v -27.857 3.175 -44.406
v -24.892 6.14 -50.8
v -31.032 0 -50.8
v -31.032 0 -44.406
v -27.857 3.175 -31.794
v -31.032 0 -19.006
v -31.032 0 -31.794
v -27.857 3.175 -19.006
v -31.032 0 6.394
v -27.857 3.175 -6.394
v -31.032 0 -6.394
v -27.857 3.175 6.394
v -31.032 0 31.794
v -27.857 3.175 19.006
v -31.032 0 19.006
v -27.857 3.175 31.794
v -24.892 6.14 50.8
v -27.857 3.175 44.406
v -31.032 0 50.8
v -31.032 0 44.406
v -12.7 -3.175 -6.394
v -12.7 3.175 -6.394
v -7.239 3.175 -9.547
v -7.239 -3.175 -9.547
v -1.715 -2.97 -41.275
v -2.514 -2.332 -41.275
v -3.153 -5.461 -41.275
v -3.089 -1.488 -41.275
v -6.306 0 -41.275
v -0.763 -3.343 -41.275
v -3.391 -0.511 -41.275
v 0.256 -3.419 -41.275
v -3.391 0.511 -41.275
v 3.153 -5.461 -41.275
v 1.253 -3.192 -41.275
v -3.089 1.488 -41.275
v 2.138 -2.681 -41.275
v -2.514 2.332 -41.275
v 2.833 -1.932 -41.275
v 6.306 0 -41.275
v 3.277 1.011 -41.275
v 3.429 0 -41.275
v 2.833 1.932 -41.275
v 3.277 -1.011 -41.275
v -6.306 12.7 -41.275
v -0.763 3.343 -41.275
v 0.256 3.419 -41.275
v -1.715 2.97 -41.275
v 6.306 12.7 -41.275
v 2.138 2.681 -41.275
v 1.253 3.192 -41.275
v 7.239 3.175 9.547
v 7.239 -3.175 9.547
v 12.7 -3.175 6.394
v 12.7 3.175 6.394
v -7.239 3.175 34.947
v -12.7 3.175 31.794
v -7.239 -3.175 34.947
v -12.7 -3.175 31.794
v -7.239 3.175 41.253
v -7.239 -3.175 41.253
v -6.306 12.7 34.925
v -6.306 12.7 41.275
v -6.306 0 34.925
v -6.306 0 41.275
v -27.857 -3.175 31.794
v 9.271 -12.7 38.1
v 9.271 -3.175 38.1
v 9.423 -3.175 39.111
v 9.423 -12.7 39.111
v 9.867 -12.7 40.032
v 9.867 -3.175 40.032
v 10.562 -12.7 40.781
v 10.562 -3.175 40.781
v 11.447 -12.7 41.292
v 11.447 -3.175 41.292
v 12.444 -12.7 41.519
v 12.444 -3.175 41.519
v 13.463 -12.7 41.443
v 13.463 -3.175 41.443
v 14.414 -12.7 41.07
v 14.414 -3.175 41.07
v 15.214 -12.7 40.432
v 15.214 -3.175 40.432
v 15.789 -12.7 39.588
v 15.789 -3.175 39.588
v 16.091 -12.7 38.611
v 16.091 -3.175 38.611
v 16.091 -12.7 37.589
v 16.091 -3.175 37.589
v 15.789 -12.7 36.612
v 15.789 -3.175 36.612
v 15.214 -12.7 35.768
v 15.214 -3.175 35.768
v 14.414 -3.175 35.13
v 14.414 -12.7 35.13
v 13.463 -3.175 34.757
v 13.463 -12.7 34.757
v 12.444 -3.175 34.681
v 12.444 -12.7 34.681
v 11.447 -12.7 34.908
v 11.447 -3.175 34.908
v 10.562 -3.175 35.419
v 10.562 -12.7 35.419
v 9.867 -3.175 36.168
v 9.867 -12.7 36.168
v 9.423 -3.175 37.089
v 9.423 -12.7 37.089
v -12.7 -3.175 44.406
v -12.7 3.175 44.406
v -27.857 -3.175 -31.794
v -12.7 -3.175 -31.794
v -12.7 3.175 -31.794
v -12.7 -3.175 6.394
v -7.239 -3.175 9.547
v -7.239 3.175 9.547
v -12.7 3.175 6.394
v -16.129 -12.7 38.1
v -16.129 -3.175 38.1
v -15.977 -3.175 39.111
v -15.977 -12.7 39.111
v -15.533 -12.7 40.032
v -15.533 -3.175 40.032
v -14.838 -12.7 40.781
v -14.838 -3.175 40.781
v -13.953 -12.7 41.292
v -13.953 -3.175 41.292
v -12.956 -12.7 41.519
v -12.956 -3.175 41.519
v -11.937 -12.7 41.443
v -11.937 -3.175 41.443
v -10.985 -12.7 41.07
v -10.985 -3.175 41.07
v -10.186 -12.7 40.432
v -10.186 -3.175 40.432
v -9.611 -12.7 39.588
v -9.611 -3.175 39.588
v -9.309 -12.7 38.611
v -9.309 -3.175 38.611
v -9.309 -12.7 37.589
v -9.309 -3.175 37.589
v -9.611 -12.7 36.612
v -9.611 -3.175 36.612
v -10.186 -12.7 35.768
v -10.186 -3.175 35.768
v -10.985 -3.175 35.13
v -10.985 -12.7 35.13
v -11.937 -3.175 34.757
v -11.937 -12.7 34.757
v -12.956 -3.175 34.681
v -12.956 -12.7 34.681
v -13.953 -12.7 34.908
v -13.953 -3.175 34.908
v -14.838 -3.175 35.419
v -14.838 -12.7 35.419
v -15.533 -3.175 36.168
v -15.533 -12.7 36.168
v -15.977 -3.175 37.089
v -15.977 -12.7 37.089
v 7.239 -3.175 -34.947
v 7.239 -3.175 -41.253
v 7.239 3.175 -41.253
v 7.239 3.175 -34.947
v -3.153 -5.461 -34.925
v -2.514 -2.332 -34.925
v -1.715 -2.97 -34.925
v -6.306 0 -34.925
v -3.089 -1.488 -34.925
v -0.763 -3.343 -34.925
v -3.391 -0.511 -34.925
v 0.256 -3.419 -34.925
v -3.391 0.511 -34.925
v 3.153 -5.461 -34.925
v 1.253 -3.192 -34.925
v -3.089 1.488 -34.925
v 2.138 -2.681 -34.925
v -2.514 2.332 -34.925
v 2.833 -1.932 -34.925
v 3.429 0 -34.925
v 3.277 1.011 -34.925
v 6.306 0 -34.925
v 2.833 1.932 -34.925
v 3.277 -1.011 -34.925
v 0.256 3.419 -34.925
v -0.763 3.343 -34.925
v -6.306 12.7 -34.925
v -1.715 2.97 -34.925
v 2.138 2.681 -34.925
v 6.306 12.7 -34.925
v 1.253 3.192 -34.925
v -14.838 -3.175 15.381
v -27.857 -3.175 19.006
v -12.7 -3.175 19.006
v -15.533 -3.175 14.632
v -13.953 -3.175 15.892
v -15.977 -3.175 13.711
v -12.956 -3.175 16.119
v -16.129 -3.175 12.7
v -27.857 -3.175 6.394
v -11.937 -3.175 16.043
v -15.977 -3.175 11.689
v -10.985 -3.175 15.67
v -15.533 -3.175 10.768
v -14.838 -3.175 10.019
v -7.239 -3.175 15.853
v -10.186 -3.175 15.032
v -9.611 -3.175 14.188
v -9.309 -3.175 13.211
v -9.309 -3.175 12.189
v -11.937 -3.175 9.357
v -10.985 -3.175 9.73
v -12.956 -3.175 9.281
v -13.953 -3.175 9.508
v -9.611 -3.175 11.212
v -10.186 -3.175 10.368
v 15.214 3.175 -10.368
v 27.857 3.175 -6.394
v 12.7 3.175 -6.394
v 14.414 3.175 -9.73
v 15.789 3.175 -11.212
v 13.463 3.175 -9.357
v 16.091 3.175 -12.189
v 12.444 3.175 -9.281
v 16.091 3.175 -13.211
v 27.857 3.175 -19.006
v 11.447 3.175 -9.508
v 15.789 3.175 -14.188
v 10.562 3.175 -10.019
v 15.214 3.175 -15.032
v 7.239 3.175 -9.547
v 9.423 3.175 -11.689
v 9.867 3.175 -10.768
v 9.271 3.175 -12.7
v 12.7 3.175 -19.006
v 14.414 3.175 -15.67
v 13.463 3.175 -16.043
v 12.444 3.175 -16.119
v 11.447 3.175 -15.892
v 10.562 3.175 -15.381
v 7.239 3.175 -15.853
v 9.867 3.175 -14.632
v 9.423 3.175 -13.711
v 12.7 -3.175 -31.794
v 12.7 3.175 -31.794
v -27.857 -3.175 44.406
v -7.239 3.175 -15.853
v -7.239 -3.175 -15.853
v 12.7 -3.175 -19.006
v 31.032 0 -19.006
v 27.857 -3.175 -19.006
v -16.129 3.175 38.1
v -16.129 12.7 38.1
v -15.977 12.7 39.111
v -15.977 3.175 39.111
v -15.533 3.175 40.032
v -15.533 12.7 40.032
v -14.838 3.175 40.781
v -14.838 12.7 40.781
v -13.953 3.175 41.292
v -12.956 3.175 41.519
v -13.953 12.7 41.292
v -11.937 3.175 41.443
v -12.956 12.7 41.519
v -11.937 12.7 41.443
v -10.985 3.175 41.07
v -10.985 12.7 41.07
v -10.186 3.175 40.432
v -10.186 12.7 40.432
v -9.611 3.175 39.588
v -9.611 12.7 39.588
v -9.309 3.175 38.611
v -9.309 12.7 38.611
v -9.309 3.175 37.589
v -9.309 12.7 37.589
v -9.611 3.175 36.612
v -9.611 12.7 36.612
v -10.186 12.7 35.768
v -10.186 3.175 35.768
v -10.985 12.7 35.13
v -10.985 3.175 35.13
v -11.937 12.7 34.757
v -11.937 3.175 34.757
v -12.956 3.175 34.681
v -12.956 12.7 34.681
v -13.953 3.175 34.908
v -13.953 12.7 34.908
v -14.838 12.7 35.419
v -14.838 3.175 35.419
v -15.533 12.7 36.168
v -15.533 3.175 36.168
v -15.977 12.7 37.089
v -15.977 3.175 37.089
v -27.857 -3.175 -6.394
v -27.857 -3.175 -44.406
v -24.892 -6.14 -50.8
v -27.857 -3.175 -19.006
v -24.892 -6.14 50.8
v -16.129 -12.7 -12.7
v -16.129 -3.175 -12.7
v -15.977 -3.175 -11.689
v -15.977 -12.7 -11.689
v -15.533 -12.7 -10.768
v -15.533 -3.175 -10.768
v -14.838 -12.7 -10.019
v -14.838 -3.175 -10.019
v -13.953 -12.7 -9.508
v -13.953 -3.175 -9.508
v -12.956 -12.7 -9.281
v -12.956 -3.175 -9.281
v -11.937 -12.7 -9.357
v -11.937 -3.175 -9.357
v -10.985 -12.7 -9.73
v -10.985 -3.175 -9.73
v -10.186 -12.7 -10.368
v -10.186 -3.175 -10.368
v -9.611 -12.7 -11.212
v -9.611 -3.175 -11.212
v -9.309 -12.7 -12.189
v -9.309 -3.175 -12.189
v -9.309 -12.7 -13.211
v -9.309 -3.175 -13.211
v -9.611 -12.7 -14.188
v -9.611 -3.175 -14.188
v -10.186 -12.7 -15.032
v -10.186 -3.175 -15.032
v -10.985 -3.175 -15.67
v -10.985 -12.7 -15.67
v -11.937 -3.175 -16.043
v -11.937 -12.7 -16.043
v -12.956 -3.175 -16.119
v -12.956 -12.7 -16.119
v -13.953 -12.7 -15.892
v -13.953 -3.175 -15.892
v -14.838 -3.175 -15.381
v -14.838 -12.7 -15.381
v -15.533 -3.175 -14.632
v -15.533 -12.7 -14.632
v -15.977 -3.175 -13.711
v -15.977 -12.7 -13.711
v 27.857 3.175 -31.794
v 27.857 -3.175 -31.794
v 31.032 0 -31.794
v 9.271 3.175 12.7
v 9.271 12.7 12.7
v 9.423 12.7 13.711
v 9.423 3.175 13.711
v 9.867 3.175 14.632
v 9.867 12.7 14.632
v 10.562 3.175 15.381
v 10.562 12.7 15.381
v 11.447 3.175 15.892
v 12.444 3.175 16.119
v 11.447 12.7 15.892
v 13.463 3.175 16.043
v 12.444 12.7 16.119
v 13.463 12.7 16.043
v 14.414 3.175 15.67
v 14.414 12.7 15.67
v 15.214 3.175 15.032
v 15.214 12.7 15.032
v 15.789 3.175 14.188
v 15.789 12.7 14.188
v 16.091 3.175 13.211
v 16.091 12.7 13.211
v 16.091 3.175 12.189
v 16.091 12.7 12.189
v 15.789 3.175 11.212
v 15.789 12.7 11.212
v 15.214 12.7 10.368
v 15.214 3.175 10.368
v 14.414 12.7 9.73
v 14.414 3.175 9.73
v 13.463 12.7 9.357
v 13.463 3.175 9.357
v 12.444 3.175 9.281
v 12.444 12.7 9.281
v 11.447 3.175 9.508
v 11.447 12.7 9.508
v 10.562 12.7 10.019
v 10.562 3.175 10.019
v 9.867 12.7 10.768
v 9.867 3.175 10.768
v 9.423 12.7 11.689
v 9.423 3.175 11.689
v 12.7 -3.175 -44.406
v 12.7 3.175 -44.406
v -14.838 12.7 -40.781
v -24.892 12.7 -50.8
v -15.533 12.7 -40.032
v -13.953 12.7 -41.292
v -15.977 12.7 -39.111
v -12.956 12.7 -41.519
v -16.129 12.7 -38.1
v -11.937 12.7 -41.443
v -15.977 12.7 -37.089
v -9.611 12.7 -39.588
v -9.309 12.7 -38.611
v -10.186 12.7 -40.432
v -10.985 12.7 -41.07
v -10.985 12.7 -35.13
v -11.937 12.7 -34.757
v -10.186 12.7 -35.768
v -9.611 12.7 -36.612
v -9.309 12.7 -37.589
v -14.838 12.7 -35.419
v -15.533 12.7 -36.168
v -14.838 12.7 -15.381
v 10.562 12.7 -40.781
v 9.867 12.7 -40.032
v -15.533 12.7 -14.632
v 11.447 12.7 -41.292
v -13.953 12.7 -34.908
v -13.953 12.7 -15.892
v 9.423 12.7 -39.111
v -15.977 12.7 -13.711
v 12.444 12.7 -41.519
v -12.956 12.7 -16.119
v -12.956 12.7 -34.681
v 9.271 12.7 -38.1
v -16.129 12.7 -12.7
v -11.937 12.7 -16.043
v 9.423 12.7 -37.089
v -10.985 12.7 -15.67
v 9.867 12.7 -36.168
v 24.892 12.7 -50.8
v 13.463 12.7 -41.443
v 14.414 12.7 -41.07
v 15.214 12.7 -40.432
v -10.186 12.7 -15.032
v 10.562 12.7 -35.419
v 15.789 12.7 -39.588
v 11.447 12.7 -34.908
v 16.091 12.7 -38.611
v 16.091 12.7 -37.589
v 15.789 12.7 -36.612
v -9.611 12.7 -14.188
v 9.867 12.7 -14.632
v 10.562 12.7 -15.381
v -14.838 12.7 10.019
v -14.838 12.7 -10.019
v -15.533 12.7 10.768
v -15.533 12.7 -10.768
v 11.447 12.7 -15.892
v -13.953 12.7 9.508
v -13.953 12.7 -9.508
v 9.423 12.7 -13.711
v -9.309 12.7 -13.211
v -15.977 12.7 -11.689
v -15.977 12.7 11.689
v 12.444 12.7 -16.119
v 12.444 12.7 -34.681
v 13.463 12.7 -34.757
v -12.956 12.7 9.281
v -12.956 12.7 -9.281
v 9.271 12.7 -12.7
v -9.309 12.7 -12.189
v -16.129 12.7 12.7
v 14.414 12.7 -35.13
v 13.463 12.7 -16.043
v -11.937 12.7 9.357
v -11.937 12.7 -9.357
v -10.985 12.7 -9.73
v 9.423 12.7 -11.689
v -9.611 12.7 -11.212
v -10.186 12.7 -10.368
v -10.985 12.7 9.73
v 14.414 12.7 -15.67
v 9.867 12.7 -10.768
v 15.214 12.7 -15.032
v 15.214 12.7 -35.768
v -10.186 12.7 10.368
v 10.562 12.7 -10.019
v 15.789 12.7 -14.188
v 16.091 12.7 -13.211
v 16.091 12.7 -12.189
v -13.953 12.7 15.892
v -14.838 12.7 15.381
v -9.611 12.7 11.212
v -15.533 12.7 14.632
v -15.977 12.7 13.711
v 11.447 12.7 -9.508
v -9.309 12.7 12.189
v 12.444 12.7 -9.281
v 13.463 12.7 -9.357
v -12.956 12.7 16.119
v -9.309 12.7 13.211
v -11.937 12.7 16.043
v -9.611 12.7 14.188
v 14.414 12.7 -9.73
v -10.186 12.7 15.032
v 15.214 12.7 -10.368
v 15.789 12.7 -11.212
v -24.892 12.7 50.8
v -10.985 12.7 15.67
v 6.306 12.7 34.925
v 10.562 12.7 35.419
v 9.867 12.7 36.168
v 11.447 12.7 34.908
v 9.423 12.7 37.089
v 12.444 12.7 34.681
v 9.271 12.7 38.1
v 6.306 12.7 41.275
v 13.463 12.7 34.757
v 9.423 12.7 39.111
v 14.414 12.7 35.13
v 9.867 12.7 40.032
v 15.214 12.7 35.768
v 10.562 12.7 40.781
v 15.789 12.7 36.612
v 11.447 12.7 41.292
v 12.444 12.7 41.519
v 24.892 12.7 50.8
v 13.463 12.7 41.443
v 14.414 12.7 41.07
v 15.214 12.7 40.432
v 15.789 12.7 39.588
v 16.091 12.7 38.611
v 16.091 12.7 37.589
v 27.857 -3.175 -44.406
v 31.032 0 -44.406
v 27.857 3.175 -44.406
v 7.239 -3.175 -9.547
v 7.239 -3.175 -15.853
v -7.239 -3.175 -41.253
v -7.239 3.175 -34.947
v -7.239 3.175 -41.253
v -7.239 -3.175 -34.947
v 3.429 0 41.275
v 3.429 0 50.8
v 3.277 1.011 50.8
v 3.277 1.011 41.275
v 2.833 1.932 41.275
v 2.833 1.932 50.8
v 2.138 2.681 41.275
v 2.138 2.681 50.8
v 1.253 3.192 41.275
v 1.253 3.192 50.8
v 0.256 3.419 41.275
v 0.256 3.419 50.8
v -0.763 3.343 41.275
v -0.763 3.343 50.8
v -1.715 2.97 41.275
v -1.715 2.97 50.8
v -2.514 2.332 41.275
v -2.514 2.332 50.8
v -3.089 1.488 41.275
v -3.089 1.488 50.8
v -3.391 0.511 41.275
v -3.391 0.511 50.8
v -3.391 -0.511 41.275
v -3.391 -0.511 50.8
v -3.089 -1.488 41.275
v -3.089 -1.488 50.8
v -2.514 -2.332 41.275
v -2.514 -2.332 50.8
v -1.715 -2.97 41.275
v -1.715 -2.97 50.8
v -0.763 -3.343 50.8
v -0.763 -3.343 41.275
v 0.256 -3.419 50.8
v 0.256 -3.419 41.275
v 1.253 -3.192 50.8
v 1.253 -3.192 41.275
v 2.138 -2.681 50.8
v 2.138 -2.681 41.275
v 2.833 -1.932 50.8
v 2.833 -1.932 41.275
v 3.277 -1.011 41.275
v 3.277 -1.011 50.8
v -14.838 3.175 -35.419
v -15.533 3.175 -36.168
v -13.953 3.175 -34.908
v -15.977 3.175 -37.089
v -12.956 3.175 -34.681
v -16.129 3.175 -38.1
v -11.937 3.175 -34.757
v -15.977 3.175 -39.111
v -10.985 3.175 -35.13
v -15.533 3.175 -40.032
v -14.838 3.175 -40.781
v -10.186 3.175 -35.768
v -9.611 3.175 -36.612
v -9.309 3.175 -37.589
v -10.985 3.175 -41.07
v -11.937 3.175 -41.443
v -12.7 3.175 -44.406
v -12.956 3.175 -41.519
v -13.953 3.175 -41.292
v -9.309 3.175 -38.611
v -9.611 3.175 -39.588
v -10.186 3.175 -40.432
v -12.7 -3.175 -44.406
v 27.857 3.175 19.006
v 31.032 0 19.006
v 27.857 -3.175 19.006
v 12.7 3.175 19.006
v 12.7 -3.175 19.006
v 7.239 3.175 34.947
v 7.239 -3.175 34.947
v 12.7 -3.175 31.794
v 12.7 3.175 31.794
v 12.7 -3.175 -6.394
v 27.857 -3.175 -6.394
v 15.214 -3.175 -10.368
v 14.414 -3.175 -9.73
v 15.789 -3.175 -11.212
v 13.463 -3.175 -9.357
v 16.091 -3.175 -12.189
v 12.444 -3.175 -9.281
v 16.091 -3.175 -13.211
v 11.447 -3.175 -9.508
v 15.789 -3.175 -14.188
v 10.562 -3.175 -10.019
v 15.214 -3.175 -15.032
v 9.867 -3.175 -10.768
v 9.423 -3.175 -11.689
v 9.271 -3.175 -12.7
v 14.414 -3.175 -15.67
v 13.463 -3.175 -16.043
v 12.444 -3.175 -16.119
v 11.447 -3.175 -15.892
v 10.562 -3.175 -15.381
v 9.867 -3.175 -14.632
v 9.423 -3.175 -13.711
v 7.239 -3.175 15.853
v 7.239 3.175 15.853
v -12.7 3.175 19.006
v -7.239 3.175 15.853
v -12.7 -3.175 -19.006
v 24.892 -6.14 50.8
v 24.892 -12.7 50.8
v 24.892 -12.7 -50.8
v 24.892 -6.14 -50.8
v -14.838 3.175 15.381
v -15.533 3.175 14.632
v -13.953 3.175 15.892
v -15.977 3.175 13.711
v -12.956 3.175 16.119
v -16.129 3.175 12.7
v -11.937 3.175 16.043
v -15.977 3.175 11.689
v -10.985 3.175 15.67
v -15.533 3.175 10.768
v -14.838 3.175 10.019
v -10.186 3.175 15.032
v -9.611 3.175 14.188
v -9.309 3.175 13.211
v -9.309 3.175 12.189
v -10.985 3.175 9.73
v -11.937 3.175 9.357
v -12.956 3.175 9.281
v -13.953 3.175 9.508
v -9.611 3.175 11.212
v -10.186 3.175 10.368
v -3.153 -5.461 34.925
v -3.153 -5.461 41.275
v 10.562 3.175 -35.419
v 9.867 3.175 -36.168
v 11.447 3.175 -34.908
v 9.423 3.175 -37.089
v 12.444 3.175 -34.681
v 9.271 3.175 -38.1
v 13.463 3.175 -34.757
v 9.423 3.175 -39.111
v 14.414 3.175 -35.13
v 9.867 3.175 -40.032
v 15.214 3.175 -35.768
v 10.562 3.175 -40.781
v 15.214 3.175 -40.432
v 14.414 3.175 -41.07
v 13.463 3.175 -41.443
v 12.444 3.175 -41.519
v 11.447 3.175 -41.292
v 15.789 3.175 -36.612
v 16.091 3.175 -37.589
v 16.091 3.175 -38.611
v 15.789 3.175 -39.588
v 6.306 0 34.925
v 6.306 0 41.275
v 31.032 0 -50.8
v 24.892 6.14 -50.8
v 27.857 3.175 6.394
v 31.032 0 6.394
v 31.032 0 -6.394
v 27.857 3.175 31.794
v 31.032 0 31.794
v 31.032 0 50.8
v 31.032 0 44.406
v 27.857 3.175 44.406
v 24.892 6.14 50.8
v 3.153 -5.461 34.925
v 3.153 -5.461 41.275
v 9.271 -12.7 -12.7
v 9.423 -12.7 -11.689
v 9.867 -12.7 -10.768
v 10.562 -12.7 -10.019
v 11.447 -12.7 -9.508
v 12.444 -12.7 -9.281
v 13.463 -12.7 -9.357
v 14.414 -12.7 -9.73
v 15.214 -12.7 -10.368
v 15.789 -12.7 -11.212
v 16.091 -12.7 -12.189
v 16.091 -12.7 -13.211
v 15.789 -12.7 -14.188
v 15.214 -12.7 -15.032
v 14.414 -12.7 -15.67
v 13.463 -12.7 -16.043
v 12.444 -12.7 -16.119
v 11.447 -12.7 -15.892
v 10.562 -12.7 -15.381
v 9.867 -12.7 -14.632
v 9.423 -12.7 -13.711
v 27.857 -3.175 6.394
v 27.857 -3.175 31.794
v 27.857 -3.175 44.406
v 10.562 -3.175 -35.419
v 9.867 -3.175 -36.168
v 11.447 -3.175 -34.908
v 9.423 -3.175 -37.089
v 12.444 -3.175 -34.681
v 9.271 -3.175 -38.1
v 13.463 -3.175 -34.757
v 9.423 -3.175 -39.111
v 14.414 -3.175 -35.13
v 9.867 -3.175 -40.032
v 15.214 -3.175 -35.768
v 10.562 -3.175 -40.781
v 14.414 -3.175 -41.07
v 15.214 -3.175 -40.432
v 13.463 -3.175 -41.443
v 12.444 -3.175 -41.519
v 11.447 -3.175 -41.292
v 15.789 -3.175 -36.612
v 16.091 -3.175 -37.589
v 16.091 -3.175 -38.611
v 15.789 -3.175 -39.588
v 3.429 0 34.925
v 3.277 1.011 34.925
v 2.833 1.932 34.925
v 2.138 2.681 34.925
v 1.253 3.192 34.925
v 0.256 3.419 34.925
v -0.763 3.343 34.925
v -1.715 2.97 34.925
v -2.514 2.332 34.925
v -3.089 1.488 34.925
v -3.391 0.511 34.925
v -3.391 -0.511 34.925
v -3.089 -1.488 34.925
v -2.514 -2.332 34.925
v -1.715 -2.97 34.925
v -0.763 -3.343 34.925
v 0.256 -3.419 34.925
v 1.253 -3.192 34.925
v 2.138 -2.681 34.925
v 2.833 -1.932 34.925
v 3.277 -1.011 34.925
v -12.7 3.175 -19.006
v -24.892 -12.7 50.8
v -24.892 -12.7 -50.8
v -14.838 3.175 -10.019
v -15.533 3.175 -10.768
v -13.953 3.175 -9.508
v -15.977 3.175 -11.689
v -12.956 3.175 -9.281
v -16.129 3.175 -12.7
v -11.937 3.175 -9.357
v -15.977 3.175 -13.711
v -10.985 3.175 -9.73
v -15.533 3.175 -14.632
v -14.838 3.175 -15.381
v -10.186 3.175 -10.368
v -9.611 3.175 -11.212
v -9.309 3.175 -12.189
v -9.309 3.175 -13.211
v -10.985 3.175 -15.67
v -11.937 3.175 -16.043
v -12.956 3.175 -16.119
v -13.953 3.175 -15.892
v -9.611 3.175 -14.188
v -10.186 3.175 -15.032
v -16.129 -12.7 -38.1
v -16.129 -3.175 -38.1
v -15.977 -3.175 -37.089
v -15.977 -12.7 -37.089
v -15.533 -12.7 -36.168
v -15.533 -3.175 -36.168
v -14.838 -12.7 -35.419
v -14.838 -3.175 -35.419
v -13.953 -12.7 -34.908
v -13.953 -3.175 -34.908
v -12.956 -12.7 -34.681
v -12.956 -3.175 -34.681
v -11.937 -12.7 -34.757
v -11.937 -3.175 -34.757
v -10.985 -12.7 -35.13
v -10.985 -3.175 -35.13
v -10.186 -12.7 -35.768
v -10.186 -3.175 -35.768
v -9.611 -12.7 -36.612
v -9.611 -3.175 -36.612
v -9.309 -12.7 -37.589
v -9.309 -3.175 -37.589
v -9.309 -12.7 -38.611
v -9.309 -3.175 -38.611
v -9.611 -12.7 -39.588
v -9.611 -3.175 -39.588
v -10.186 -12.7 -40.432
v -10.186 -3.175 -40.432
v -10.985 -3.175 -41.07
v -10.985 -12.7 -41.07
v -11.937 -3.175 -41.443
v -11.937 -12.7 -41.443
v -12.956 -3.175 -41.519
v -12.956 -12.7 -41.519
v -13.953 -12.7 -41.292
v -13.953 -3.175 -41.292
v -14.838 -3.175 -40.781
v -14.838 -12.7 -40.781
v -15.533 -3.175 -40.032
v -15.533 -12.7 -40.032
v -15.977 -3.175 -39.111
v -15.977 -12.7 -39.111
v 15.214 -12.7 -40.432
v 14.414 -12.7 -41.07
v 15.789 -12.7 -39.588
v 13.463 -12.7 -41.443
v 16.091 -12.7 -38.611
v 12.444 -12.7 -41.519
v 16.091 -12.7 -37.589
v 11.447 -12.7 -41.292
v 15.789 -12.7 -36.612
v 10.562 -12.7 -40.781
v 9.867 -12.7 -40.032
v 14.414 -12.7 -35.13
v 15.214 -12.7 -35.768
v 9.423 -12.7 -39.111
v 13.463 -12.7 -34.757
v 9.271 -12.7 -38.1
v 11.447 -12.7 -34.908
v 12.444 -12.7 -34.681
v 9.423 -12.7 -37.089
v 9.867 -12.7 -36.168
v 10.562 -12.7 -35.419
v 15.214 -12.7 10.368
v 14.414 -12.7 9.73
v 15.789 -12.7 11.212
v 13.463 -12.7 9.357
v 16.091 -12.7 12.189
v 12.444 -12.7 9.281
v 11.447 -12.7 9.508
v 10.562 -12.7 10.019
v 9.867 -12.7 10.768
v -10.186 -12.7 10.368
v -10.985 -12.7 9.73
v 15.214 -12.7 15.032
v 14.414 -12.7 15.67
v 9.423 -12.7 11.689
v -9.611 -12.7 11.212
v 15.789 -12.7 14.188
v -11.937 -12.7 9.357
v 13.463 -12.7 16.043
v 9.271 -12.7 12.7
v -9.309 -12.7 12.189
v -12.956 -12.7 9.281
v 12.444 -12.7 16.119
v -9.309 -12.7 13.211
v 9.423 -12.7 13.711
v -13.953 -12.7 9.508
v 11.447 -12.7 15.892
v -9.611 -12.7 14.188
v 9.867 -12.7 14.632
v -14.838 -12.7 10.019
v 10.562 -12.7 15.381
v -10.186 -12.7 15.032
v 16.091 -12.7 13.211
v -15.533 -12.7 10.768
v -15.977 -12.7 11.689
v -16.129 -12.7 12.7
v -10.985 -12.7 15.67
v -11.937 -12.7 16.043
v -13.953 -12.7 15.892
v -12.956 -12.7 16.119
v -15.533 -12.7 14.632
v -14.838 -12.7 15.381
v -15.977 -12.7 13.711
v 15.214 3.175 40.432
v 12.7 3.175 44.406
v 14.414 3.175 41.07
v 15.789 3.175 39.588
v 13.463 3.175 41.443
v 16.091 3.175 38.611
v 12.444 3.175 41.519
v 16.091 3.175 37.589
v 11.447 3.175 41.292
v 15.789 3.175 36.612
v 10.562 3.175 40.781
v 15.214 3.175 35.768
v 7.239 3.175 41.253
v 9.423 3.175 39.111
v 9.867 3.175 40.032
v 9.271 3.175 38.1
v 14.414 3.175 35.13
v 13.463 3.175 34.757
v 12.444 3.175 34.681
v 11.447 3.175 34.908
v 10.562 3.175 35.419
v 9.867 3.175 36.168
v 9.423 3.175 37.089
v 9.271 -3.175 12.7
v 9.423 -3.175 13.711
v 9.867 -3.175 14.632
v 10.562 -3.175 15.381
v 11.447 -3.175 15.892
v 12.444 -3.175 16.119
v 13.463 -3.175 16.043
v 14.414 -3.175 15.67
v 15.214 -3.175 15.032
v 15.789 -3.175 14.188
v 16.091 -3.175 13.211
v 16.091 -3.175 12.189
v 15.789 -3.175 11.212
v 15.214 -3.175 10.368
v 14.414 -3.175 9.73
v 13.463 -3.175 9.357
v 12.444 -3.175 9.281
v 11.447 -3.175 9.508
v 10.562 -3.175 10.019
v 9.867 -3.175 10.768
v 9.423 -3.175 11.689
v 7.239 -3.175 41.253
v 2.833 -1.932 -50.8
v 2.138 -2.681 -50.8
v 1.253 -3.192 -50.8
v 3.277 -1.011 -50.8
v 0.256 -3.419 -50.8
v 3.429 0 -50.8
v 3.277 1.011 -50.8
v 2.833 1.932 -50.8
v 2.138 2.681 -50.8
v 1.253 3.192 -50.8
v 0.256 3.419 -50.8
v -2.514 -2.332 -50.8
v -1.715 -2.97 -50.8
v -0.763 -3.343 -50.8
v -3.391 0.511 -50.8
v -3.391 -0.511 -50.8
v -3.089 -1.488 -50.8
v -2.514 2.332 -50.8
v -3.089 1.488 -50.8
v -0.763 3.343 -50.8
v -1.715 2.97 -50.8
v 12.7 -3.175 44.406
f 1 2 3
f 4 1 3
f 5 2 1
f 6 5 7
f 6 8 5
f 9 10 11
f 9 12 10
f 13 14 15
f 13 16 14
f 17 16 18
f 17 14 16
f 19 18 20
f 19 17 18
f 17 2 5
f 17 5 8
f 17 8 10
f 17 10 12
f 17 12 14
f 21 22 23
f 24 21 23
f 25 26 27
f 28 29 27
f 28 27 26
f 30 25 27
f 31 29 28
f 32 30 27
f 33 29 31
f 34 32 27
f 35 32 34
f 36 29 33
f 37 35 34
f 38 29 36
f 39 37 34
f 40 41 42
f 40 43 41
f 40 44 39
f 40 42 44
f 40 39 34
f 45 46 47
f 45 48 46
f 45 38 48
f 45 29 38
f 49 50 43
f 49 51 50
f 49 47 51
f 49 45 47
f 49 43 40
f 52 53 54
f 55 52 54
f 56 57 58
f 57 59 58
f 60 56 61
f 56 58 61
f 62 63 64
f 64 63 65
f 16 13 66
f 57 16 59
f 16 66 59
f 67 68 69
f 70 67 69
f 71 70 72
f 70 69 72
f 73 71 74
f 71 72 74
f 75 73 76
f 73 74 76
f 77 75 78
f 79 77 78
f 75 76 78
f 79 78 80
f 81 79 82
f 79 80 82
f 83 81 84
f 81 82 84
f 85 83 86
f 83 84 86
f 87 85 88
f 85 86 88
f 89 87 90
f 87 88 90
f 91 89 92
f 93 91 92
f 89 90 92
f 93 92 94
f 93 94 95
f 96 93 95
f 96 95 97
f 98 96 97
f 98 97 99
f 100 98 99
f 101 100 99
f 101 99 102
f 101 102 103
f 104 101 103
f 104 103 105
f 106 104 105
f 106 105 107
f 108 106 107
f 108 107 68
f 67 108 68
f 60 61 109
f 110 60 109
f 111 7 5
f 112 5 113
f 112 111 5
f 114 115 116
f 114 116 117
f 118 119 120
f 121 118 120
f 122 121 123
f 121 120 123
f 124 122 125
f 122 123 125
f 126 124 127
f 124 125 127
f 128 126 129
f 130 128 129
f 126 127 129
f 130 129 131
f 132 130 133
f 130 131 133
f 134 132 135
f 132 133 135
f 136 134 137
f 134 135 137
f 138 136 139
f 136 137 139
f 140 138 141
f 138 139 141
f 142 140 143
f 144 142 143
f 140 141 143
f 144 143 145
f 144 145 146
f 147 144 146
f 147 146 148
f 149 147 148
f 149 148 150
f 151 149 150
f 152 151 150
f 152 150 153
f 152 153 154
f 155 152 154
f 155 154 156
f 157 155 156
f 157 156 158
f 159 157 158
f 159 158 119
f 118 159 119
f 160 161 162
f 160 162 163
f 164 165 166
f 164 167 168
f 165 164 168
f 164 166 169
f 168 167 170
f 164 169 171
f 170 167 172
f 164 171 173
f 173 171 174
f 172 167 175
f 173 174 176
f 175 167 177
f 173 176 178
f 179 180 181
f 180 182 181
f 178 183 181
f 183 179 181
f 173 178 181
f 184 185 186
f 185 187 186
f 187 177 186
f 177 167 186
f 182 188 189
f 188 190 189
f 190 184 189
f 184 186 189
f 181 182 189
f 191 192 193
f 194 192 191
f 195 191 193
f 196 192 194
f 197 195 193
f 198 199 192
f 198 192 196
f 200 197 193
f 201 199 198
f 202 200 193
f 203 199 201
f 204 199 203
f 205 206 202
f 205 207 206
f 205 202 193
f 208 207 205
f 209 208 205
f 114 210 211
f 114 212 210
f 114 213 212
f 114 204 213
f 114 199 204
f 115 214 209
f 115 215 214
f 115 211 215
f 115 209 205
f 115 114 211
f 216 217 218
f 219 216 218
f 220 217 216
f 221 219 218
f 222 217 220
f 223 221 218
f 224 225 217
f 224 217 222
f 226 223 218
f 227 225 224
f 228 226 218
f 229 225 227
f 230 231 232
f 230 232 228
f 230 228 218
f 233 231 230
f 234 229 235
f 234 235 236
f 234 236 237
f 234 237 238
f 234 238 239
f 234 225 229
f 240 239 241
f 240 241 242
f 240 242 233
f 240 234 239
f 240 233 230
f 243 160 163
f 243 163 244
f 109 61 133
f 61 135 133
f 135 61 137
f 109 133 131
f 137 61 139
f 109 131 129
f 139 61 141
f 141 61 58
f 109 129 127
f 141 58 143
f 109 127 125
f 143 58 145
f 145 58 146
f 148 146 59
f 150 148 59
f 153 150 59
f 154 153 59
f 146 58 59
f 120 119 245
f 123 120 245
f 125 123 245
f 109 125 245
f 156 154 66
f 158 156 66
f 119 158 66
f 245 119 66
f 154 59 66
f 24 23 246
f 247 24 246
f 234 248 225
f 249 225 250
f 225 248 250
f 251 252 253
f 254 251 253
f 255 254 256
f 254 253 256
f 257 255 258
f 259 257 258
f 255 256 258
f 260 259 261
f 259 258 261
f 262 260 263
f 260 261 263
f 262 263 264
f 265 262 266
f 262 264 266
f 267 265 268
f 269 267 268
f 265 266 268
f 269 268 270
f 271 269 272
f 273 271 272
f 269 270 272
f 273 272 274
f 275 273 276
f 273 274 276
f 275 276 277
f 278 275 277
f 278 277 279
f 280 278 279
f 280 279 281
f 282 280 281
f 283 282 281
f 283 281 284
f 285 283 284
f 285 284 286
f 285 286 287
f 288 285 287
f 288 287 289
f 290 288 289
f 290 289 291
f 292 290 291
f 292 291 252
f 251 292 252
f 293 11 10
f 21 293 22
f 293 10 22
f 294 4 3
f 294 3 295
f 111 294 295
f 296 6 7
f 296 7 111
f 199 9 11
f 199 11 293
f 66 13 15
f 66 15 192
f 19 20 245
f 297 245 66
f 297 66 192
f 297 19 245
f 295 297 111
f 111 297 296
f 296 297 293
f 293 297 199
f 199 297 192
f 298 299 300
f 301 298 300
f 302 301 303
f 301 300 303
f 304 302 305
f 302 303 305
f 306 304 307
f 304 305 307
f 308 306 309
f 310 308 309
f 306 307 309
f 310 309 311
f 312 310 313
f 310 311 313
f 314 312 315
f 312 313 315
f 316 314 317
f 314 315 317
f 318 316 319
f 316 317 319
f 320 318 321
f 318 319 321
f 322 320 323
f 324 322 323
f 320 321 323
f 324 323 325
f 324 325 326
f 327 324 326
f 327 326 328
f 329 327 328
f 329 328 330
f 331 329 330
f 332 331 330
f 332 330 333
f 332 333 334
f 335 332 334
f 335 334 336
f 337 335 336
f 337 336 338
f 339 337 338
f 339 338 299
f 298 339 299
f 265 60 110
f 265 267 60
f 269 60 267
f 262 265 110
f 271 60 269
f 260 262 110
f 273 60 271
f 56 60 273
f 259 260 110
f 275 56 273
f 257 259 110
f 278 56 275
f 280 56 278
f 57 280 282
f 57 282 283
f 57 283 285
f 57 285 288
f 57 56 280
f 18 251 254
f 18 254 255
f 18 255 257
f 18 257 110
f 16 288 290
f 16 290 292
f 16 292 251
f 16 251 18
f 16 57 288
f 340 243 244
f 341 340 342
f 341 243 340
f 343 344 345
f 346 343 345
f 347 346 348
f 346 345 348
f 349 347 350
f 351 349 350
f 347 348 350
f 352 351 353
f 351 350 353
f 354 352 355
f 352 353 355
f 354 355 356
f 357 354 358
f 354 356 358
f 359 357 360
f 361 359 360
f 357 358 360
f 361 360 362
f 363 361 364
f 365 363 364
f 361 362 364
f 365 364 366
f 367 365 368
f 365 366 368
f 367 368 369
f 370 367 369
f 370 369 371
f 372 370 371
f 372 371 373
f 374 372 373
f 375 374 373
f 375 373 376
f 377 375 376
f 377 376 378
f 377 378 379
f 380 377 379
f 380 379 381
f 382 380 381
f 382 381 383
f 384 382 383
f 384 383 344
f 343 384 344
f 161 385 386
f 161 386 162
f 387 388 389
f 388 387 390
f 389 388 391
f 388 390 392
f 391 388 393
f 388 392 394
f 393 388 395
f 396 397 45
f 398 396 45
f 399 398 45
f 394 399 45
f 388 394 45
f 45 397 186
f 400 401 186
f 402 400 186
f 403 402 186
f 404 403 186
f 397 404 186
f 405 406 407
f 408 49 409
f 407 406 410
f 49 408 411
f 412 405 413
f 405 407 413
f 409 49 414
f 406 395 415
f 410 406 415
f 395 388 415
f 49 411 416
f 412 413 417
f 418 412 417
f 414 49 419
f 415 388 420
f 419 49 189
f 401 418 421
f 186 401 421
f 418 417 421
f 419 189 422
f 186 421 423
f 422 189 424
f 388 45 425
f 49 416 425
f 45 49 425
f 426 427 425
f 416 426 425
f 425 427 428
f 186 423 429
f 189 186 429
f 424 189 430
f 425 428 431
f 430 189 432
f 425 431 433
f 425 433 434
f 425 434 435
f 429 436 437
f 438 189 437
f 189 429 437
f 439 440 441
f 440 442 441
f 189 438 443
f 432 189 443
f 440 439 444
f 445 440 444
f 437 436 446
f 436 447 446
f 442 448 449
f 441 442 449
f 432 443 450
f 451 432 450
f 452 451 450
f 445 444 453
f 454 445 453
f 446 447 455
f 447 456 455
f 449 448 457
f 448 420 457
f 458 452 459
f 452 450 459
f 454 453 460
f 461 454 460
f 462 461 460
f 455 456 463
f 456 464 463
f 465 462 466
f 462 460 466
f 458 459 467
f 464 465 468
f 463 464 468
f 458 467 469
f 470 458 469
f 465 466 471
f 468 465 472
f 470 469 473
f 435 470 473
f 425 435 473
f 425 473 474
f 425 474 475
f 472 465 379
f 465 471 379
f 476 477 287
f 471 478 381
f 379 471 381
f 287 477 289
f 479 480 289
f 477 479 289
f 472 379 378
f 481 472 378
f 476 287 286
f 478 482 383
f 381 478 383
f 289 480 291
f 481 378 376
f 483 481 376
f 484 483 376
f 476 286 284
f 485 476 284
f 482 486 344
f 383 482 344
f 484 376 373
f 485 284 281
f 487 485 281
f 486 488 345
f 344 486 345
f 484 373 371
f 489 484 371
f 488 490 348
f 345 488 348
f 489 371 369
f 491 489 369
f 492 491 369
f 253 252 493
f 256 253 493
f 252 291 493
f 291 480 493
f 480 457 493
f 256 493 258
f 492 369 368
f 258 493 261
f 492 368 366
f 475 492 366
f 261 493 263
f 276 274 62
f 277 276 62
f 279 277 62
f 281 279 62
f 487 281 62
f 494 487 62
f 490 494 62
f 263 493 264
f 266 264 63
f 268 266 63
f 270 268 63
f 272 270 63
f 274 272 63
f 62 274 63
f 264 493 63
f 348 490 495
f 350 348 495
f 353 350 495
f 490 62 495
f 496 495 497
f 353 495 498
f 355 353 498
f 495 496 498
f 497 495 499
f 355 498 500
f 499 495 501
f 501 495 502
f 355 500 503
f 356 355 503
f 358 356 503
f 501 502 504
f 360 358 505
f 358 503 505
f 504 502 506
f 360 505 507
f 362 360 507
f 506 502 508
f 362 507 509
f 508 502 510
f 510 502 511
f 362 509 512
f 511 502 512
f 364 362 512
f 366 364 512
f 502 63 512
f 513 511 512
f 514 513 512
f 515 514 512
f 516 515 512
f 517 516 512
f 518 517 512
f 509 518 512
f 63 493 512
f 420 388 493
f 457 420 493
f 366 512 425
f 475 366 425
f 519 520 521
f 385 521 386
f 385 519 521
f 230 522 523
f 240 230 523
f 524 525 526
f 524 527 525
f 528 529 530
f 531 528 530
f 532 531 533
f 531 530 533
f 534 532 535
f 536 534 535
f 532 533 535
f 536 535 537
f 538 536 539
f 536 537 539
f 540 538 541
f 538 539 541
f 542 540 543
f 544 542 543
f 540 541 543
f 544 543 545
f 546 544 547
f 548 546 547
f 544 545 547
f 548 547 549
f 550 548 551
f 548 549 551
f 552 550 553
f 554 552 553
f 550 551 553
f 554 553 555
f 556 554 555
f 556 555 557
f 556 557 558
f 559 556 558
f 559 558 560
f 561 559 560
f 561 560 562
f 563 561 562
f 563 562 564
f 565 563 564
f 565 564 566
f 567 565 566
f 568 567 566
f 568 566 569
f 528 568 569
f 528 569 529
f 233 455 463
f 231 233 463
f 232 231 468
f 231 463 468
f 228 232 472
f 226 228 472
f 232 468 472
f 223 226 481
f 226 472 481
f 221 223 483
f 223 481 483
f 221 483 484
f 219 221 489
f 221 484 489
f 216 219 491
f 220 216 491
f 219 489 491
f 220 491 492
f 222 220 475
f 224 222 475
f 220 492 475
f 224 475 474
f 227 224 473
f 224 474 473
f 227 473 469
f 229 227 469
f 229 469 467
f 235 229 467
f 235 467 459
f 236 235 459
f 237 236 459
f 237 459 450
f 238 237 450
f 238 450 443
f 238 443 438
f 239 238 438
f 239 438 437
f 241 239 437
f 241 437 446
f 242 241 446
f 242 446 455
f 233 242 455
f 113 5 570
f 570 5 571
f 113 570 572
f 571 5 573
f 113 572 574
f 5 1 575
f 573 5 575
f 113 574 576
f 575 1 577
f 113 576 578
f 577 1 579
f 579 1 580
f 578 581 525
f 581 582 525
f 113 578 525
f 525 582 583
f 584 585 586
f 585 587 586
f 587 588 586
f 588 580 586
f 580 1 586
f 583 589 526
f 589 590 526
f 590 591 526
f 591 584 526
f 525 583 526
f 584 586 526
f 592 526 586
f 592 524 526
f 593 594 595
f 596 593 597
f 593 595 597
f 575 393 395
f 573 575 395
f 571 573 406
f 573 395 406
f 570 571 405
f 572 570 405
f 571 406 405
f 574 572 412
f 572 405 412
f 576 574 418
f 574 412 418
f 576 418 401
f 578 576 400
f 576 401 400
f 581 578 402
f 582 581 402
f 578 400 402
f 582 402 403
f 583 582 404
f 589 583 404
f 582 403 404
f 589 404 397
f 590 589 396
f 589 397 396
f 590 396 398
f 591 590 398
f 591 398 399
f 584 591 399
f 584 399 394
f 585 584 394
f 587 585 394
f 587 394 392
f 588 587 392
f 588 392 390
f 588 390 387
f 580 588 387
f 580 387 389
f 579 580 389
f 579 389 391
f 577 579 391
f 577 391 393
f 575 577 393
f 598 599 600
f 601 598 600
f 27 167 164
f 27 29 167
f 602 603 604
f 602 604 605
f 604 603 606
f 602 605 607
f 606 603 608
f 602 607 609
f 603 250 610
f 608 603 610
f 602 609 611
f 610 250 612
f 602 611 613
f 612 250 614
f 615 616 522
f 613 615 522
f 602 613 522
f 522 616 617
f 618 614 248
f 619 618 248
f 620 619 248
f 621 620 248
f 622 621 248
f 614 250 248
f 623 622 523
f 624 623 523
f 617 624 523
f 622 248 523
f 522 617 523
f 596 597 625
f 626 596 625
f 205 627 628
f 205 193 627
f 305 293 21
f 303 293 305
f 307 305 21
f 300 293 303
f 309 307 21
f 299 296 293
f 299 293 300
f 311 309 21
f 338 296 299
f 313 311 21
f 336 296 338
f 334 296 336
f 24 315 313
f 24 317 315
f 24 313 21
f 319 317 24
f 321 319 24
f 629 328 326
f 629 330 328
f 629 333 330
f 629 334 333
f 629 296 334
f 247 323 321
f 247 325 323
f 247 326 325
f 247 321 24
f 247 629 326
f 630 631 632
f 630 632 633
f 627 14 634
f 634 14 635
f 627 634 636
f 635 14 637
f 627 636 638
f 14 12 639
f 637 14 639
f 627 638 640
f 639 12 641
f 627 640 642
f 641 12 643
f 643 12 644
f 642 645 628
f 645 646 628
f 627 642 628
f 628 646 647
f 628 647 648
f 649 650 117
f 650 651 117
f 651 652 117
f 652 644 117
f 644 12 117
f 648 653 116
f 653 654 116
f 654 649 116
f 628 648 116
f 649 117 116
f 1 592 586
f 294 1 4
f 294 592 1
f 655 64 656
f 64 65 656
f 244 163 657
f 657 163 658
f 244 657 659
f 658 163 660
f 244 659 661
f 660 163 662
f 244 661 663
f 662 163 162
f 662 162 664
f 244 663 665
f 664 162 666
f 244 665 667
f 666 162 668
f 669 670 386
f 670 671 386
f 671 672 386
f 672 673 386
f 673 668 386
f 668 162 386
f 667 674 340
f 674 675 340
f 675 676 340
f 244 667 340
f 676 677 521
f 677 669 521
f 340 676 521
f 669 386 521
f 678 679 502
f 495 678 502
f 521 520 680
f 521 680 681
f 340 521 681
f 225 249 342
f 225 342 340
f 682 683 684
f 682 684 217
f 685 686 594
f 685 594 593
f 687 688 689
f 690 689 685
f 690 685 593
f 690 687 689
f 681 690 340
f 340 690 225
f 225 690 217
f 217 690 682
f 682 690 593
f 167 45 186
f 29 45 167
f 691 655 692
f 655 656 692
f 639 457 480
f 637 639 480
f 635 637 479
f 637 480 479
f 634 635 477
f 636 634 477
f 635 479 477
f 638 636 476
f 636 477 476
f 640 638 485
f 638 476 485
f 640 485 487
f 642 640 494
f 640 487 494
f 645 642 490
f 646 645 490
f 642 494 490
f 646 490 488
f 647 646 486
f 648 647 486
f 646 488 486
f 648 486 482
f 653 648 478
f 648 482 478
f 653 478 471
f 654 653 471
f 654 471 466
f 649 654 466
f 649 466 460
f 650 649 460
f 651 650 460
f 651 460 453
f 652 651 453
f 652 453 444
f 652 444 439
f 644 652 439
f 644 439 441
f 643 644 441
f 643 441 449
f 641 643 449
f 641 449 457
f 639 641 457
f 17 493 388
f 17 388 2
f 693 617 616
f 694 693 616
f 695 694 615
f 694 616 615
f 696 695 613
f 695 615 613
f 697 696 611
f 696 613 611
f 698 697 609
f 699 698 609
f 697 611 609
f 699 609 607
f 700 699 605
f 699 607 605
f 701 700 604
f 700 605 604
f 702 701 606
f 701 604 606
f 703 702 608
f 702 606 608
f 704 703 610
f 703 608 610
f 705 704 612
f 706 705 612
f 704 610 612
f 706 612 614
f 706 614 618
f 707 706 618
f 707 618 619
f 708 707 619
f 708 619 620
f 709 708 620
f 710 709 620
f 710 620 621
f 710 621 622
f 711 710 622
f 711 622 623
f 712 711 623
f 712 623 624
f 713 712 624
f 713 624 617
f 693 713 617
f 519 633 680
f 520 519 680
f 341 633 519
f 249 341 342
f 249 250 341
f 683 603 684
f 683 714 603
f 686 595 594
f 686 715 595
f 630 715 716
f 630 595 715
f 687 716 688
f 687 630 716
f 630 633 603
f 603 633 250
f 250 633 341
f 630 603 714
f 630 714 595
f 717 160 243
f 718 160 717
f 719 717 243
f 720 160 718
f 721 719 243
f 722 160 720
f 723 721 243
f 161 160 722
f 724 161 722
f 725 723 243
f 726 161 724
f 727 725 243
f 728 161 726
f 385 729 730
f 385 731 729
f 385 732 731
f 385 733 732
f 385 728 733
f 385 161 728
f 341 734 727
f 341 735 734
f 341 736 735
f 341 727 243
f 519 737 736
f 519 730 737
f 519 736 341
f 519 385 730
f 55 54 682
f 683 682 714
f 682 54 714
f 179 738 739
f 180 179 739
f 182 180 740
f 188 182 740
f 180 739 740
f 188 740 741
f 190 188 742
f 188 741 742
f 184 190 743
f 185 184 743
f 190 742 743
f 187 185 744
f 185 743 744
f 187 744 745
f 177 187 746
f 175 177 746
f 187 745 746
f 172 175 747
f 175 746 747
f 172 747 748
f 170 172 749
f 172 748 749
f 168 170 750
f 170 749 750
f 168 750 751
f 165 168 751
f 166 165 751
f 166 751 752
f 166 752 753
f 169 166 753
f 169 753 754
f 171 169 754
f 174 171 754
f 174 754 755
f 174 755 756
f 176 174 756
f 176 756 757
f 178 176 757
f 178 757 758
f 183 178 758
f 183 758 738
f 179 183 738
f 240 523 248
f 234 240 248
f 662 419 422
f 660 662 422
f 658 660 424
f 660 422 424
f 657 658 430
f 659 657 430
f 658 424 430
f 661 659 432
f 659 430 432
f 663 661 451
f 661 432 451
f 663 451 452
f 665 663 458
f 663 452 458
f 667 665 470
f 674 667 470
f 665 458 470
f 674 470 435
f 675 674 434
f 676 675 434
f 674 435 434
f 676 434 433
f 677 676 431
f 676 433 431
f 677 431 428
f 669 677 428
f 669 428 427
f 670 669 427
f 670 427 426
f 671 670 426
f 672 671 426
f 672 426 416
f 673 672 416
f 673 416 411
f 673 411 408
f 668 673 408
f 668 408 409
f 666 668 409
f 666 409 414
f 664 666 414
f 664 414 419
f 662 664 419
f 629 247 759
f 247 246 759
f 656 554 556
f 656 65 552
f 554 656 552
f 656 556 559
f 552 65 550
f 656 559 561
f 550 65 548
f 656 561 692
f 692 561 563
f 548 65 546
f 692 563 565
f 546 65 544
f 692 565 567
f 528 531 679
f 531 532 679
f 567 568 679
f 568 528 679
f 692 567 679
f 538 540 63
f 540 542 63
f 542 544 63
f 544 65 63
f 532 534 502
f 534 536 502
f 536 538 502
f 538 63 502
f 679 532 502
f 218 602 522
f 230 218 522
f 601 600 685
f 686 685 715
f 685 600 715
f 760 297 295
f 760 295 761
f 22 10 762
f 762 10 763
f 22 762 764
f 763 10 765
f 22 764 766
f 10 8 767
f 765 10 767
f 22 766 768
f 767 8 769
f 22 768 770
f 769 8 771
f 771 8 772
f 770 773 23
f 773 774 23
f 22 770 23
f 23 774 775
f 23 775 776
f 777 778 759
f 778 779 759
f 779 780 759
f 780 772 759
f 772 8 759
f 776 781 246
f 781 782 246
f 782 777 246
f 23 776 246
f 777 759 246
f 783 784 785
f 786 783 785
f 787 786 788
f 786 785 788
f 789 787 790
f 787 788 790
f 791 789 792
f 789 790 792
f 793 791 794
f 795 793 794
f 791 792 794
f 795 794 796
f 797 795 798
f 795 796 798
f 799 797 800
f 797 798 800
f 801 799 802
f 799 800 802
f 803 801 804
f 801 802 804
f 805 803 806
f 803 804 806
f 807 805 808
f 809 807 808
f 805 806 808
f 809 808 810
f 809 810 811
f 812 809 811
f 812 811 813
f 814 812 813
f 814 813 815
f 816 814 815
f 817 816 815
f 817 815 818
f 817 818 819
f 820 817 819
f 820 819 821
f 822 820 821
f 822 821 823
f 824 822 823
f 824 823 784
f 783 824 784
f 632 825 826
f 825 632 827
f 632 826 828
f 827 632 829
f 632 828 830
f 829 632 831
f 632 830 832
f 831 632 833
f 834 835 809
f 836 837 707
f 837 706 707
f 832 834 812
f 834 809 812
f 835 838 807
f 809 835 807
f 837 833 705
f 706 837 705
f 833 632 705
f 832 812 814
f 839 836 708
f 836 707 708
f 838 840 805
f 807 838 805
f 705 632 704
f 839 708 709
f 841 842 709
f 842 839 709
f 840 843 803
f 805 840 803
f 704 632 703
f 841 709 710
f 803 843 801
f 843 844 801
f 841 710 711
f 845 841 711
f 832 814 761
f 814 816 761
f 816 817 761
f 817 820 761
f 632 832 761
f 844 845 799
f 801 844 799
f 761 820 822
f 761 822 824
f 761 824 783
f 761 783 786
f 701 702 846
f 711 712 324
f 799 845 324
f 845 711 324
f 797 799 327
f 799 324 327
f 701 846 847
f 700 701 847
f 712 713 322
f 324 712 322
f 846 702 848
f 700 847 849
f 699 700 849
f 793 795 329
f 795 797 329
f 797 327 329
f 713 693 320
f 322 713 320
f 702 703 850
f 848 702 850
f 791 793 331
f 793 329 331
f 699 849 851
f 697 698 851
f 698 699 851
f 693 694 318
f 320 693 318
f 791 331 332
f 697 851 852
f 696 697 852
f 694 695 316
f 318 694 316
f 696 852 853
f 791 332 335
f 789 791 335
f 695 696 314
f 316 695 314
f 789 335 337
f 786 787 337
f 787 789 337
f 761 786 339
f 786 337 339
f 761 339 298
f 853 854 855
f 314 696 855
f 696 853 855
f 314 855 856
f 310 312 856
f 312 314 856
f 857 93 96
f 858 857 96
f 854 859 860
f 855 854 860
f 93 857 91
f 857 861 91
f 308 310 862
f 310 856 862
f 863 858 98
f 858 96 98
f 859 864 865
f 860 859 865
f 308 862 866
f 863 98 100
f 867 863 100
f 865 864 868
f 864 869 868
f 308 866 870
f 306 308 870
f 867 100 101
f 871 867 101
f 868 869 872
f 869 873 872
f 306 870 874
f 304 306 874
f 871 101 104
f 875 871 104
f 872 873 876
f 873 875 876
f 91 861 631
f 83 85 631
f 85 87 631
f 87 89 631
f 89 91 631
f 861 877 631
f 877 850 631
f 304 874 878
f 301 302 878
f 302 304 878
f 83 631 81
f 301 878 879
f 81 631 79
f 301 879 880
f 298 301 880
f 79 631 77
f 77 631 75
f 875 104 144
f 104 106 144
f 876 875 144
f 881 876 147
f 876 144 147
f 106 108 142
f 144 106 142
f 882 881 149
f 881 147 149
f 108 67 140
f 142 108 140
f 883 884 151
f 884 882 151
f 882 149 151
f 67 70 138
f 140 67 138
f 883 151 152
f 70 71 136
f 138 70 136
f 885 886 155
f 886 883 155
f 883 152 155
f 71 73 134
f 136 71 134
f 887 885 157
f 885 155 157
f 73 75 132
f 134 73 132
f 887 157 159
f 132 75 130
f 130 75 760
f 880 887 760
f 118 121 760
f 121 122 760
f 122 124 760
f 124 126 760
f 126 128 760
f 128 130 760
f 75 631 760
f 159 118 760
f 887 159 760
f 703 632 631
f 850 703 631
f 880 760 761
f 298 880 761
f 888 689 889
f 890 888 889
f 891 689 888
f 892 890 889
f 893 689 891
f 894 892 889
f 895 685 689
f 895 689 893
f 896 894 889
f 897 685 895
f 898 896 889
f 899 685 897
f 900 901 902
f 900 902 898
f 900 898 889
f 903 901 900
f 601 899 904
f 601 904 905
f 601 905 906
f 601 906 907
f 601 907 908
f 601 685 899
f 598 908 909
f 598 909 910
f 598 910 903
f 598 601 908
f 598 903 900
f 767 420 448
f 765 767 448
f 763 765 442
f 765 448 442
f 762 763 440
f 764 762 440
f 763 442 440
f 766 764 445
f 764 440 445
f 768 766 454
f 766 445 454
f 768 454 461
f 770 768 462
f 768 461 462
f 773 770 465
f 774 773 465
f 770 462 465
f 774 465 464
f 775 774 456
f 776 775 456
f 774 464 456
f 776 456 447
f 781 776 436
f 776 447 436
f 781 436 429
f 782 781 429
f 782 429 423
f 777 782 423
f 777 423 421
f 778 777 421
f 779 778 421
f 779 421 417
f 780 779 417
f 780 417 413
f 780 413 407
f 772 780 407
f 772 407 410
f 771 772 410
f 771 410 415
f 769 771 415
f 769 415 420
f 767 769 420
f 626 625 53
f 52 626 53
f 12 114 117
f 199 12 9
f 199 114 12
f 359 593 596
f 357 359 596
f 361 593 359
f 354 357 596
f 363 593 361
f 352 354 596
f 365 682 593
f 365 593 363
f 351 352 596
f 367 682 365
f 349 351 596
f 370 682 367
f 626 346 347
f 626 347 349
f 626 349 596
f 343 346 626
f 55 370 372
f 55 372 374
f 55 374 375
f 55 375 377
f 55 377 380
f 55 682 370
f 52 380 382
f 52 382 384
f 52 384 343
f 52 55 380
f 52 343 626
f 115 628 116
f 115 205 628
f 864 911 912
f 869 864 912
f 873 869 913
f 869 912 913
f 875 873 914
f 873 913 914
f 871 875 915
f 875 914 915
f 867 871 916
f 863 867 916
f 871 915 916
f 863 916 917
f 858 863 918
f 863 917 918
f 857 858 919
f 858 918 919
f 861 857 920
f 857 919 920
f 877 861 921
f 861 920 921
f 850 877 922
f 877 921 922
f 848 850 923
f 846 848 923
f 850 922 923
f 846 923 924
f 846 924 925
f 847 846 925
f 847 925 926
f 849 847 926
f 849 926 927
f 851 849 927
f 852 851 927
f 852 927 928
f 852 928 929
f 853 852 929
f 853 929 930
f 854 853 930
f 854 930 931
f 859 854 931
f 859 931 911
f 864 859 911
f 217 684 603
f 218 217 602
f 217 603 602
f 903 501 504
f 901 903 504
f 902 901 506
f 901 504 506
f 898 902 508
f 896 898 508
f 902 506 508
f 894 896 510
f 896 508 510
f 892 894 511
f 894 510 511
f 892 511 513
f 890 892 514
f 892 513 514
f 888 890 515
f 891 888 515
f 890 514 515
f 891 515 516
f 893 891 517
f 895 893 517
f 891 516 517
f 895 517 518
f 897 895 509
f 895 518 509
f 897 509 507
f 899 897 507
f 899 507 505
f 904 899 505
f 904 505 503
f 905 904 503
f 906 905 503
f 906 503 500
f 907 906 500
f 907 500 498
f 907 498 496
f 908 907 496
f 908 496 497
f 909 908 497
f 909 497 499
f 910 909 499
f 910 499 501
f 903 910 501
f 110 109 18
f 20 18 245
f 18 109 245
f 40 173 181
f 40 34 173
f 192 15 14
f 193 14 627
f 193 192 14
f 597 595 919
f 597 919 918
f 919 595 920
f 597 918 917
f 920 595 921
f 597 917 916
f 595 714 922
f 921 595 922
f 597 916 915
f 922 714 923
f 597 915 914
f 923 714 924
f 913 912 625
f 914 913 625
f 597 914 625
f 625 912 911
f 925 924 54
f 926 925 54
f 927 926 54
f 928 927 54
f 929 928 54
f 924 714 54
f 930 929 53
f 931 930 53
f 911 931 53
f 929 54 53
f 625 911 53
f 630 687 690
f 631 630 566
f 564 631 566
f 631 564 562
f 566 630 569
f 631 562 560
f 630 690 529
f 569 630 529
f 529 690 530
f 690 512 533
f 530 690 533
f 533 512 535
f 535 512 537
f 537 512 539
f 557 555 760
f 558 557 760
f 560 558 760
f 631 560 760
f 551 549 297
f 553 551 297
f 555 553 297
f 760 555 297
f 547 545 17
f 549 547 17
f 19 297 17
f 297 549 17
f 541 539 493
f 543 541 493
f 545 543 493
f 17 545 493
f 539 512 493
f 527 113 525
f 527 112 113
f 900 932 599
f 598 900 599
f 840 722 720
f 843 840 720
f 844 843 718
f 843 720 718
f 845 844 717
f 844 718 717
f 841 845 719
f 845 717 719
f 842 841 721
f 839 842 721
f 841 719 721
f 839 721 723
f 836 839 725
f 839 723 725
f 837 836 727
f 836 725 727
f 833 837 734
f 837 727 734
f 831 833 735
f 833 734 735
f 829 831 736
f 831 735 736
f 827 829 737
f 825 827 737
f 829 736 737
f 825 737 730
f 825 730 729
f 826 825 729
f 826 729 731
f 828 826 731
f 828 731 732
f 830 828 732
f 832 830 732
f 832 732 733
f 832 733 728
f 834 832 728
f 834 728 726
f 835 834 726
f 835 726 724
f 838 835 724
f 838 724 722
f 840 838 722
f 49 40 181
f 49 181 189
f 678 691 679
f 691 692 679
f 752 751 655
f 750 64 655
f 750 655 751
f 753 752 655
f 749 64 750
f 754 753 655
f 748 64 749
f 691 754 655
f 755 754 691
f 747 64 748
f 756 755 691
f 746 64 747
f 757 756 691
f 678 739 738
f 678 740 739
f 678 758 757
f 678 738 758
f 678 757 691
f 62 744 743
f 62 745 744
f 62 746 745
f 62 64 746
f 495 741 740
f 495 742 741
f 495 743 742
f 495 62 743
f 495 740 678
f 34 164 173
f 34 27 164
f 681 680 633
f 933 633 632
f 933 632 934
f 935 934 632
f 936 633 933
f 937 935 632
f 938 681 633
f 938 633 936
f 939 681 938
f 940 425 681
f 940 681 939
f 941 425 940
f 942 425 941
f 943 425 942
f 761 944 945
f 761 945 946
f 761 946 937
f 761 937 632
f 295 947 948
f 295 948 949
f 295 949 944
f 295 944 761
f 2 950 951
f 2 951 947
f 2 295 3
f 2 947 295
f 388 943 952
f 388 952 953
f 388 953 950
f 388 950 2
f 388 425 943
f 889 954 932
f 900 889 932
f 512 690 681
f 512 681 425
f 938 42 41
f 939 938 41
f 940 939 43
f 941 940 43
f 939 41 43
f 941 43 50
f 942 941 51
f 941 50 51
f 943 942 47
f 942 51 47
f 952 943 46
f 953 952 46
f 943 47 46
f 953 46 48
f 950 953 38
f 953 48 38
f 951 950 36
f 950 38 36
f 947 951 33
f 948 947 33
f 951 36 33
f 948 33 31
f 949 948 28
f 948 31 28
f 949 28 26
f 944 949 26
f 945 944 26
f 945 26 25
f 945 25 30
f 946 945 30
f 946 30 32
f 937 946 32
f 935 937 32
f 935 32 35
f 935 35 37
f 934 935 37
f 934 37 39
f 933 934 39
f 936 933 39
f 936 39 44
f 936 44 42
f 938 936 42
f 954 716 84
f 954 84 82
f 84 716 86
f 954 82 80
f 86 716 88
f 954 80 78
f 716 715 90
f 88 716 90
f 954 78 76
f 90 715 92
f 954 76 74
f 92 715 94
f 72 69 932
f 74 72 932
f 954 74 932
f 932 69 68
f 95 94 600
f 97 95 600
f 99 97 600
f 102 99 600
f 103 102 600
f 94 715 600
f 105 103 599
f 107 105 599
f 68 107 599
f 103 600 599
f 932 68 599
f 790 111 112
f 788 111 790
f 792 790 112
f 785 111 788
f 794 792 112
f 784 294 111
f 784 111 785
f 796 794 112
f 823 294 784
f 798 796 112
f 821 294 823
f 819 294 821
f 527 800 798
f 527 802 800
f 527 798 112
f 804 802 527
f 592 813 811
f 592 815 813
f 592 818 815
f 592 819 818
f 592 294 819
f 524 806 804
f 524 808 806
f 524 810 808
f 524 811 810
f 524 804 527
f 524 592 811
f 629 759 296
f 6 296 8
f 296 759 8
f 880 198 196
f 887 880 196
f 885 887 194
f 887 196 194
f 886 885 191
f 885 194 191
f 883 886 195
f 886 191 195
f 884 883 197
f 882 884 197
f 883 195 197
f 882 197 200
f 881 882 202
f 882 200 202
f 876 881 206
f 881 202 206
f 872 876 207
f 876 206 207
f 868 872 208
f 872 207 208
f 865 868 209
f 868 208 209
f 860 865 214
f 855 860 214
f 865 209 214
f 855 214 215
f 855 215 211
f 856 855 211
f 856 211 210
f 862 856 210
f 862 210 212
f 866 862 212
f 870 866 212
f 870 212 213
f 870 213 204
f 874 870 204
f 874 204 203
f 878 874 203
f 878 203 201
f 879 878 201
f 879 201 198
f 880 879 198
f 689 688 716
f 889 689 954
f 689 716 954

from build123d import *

# Parameters (mm, degrees)
BOSS_EXTRUDE1_DEPTH = 50.8
CUT_EXTRUDE1_DEPTH  = 3.175
SKETCH3_R           = 3.429
CUT_EXTRUDE2_DEPTH  = 66.068137364
SKETCH5_R           = 3.429
CUT_EXTRUDE4_DEPTH  = 108.200338152
CUT_EXTRUDE9_START  = 38.1
CUT_EXTRUDE9_DEPTH  = 3.175
SKETCH11_OUTSIDE_W  = 89.994
SKETCH11_OUTSIDE_H  = 51.894
TRIM_DEPTH          = 108.200338152


with BuildPart() as part:
    # Sketch1 → Boss-Extrude1 (new, symmetric)
    with BuildSketch(Plane.XY):
        Polygon((-25.4, 6.35), (-25.4, 12.7), (25.4, 12.7), (25.4, 6.35), (31.75, 0), (25.4, -6.35), (25.4, -12.7), (-25.4, -12.7), (-25.4, -6.35), (-31.75, 0), align=None)
    extrude(amount=BOSS_EXTRUDE1_DEPTH, both=True)

    # Sketch2 → Cut-Extrude1 (cut, symmetric)
    with BuildSketch(Plane(origin=(0, 0, 0), x_dir=(1, 0, 0), z_dir=(0, 1, 0))):
        Polygon((48.874015971, 6.39418036), (12.7, 6.39418036), (7.239, 9.54709018), (7.239, 15.85290982), (12.7, 19.00581964), (48.874015971, 19.00581964), align=None)
        Polygon((48.874015971, -19.00581964), (12.7, -19.00581964), (7.239, -15.85290982), (7.239, -9.54709018), (12.7, -6.39418036), (48.874015971, -6.39418036), align=None)
        Polygon((7.239, 34.94709018), (12.7, 31.79418036), (48.874015971, 31.79418036), (48.874015971, 44.40581964), (12.7, 44.40581964), (7.239, 41.25290982), align=None)
        Polygon((48.874015971, -44.40581964), (12.7, -44.40581964), (7.239, -41.25290982), (7.239, -34.94709018), (12.7, -31.79418036), (48.874015971, -31.79418036), align=None)
        Polygon((-7.239, -34.94709018), (-7.239, -41.25290982), (-12.7, -44.40581964), (-48.874015971, -44.40581964), (-48.874015971, -31.79418036), (-12.7, -31.79418036), align=None)
        Polygon((-48.874015971, -6.39418036), (-48.874015971, -19.00581964), (-12.7, -19.00581964), (-7.239, -15.85290982), (-7.239, -9.54709018), (-12.7, -6.39418036), align=None)
        Polygon((-48.874015971, 31.79418036), (-12.7, 31.79418036), (-7.239, 34.94709018), (-7.239, 41.25290982), (-12.7, 44.40581964), (-48.874015971, 44.40581964), align=None)
        Polygon((-48.874015971, 19.00581964), (-48.874015971, 6.39418036), (-12.7, 6.39418036), (-7.239, 9.54709018), (-7.239, 15.85290982), (-12.7, 19.00581964), align=None)
    extrude(amount=CUT_EXTRUDE1_DEPTH, both=True, mode=Mode.SUBTRACT)

    # Sketch3 → Cut-Extrude2 (cut, through all)
    with BuildSketch(Plane(origin=(0, 12.7, 0), x_dir=(1, 0, 0), z_dir=(0, 1, 0))):
        with Locations(Location((-12.7, 38.1, 0), (0, 0, 180))):
            Circle(SKETCH3_R)
        with Locations(Location((12.7, 38.1, 0), (0, 0, 180))):
            Circle(SKETCH3_R)
        with Locations(Location((12.7, 12.7, 0), (0, 0, 180))):
            Circle(SKETCH3_R)
        with Locations(Location((-12.7, 12.7, 0), (0, 0, 180))):
            Circle(SKETCH3_R)
        with Locations(Location((-12.7, -12.7, 0), (0, 0, 180))):
            Circle(SKETCH3_R)
        with Locations(Location((12.7, -12.7, 0), (0, 0, 180))):
            Circle(SKETCH3_R)
        with Locations(Location((-12.7, -38.1, 0), (0, 0, 180))):
            Circle(SKETCH3_R)
        with Locations(Location((12.7, -38.1, 0), (0, 0, 180))):
            Circle(SKETCH3_R)
    extrude(amount=-CUT_EXTRUDE2_DEPTH, mode=Mode.SUBTRACT)

    # Sketch5 → Cut-Extrude4 (cut, through all)
    with BuildSketch(Plane.XY.offset(50.8)):
        Circle(SKETCH5_R)
    extrude(amount=-CUT_EXTRUDE4_DEPTH, mode=Mode.SUBTRACT)

    # Sketch10 → Cut-Extrude9 (cut, symmetric)
    with BuildSketch(Plane.XY.offset(CUT_EXTRUDE9_START)):
        Polygon((3.15290982, -5.461), (6.30581964, 0), (6.30581964, 55.166180444), (-6.30581964, 55.166180444), (-6.30581964, 0), (-3.15290982, -5.461), align=None)
    cut_extrude9 = extrude(amount=CUT_EXTRUDE9_DEPTH, both=True, mode=Mode.SUBTRACT)

    # Mirror1: Cut-Extrude9 across plane
    add(cut_extrude9.mirror(Plane.XY), mode=Mode.SUBTRACT)

    # Sketch11 outside → Trim (cut, through all)
    with BuildSketch(Plane.XY.offset(50.8)):
        Rectangle(SKETCH11_OUTSIDE_W, SKETCH11_OUTSIDE_H)
        Polygon((-24.892, 12.7), (-24.892, 6.13957951), (-31.03157951, 0), (-24.892, -6.13957951), (-24.892, -12.7), (24.892, -12.7), (24.892, -6.13957951), (31.03157951, 0), (24.892, 6.13957951), (24.892, 12.7), align=None, mode=Mode.SUBTRACT)
    extrude(amount=-TRIM_DEPTH, mode=Mode.SUBTRACT)


solid = part.part
